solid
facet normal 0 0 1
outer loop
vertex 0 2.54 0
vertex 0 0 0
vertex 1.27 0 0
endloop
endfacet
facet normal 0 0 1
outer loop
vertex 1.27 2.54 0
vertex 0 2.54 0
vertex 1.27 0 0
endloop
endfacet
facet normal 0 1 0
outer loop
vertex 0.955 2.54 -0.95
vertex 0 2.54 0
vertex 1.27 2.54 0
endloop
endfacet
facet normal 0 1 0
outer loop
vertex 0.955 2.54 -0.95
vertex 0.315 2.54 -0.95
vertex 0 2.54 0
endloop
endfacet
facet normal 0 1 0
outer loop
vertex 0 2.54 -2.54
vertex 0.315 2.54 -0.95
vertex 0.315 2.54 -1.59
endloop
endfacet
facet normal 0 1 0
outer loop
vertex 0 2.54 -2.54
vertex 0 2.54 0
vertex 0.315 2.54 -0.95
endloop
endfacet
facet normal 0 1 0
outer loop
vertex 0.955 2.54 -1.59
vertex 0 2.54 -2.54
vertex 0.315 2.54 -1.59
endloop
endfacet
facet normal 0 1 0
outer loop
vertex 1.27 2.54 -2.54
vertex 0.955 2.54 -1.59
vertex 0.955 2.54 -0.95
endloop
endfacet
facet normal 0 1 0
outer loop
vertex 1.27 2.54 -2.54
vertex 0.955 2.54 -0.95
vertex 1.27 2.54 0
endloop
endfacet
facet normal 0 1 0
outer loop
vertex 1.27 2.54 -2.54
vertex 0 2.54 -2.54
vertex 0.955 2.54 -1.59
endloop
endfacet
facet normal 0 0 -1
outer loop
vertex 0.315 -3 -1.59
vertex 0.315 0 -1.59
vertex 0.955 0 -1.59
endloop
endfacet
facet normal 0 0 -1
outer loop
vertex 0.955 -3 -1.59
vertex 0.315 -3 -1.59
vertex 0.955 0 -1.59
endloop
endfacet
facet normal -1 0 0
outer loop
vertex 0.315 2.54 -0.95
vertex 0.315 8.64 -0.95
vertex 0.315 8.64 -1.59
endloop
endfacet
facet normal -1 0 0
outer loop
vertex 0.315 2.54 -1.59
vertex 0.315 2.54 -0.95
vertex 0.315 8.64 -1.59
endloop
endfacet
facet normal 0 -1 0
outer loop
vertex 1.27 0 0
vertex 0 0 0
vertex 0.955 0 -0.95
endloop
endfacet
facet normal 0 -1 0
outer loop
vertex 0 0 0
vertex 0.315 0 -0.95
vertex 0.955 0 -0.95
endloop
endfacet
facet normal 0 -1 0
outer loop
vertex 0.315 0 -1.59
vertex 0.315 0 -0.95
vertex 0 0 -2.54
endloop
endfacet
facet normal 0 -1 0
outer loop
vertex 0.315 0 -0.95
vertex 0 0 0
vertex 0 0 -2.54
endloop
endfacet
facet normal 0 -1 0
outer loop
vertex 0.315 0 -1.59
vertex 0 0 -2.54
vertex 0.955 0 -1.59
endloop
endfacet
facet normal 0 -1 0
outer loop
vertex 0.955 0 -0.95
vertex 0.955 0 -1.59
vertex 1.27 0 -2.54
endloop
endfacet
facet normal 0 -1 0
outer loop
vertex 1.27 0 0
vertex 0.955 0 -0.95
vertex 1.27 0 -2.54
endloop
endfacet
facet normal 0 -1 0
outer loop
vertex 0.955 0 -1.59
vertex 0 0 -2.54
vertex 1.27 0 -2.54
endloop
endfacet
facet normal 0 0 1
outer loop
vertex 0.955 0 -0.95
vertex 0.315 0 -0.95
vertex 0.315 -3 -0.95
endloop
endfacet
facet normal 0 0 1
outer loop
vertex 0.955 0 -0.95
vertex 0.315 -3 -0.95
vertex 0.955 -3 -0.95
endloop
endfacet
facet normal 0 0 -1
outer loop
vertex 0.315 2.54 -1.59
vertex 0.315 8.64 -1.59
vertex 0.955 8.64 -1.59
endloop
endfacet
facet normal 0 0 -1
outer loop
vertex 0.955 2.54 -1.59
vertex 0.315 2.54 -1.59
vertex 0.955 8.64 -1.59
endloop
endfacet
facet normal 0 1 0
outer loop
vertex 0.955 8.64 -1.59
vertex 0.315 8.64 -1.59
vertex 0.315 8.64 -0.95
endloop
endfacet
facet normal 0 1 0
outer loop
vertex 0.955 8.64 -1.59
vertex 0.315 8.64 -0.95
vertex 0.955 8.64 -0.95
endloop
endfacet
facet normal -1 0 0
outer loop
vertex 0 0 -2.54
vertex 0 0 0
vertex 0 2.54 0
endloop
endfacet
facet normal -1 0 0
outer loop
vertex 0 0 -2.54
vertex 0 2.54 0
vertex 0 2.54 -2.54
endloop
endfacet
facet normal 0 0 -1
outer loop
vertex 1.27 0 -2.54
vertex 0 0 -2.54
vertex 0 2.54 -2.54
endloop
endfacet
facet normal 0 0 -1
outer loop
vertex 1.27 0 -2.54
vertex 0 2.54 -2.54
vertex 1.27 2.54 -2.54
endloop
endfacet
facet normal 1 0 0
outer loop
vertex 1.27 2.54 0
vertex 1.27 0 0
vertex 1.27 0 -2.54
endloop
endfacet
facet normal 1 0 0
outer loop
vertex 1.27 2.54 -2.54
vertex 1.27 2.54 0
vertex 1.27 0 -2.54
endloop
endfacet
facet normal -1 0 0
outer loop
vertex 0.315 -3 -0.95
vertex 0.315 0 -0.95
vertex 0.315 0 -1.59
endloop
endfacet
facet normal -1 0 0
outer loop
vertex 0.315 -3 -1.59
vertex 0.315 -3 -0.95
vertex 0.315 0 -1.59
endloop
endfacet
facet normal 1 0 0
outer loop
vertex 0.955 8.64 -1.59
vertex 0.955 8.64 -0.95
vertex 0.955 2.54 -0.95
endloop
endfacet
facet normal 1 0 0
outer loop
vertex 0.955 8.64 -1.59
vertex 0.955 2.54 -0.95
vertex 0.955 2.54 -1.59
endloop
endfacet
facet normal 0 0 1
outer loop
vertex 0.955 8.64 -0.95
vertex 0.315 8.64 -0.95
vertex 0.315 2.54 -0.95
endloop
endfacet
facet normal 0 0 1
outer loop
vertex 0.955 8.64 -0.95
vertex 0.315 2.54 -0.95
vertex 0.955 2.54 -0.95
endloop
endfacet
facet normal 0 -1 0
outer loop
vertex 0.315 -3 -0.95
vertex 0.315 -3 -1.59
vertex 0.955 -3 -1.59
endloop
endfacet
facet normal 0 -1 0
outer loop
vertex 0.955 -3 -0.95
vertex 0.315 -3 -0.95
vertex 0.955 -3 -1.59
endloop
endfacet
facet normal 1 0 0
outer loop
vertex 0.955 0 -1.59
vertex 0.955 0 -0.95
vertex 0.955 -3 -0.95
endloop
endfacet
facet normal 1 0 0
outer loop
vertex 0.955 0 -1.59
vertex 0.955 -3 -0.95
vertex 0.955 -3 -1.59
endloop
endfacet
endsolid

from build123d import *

# Parameters (mm, degrees)
SKETCH1_W                = 1.27
SKETCH1_H                = 2.54
BOSS_EXTRUDE1_DEPTH      = 2.54
SKETCH2_W                = 0.64
SKETCH2_H                = 0.64
BOSS_EXTRUDE2_DEPTH      = 6.1
BOSS_EXTRUDE2_DEPTH_BACK = 5.54


with BuildPart() as part:
    # Sketch1 → Boss-Extrude1 (new body)
    with BuildSketch(Plane(origin=(0, 0, 0), x_dir=(1, 0, 0), z_dir=(0, 1, 0))):
        with Locations((0.635, 1.27)):
            Rectangle(SKETCH1_W, SKETCH1_H)
    extrude(amount=BOSS_EXTRUDE1_DEPTH)

    # Sketch2 → Boss-Extrude2 (add, two sides)
    with BuildSketch(Plane(origin=(0, 2.54, 0), x_dir=(1, 0, 0), z_dir=(0, 1, 0))) as boss_extrude2_sk:
        with Locations((0.635, 1.27)):
            Rectangle(SKETCH2_W, SKETCH2_H)
    extrude(amount=BOSS_EXTRUDE2_DEPTH)
    extrude(boss_extrude2_sk.sketch, amount=-BOSS_EXTRUDE2_DEPTH_BACK)


solid = part.part
